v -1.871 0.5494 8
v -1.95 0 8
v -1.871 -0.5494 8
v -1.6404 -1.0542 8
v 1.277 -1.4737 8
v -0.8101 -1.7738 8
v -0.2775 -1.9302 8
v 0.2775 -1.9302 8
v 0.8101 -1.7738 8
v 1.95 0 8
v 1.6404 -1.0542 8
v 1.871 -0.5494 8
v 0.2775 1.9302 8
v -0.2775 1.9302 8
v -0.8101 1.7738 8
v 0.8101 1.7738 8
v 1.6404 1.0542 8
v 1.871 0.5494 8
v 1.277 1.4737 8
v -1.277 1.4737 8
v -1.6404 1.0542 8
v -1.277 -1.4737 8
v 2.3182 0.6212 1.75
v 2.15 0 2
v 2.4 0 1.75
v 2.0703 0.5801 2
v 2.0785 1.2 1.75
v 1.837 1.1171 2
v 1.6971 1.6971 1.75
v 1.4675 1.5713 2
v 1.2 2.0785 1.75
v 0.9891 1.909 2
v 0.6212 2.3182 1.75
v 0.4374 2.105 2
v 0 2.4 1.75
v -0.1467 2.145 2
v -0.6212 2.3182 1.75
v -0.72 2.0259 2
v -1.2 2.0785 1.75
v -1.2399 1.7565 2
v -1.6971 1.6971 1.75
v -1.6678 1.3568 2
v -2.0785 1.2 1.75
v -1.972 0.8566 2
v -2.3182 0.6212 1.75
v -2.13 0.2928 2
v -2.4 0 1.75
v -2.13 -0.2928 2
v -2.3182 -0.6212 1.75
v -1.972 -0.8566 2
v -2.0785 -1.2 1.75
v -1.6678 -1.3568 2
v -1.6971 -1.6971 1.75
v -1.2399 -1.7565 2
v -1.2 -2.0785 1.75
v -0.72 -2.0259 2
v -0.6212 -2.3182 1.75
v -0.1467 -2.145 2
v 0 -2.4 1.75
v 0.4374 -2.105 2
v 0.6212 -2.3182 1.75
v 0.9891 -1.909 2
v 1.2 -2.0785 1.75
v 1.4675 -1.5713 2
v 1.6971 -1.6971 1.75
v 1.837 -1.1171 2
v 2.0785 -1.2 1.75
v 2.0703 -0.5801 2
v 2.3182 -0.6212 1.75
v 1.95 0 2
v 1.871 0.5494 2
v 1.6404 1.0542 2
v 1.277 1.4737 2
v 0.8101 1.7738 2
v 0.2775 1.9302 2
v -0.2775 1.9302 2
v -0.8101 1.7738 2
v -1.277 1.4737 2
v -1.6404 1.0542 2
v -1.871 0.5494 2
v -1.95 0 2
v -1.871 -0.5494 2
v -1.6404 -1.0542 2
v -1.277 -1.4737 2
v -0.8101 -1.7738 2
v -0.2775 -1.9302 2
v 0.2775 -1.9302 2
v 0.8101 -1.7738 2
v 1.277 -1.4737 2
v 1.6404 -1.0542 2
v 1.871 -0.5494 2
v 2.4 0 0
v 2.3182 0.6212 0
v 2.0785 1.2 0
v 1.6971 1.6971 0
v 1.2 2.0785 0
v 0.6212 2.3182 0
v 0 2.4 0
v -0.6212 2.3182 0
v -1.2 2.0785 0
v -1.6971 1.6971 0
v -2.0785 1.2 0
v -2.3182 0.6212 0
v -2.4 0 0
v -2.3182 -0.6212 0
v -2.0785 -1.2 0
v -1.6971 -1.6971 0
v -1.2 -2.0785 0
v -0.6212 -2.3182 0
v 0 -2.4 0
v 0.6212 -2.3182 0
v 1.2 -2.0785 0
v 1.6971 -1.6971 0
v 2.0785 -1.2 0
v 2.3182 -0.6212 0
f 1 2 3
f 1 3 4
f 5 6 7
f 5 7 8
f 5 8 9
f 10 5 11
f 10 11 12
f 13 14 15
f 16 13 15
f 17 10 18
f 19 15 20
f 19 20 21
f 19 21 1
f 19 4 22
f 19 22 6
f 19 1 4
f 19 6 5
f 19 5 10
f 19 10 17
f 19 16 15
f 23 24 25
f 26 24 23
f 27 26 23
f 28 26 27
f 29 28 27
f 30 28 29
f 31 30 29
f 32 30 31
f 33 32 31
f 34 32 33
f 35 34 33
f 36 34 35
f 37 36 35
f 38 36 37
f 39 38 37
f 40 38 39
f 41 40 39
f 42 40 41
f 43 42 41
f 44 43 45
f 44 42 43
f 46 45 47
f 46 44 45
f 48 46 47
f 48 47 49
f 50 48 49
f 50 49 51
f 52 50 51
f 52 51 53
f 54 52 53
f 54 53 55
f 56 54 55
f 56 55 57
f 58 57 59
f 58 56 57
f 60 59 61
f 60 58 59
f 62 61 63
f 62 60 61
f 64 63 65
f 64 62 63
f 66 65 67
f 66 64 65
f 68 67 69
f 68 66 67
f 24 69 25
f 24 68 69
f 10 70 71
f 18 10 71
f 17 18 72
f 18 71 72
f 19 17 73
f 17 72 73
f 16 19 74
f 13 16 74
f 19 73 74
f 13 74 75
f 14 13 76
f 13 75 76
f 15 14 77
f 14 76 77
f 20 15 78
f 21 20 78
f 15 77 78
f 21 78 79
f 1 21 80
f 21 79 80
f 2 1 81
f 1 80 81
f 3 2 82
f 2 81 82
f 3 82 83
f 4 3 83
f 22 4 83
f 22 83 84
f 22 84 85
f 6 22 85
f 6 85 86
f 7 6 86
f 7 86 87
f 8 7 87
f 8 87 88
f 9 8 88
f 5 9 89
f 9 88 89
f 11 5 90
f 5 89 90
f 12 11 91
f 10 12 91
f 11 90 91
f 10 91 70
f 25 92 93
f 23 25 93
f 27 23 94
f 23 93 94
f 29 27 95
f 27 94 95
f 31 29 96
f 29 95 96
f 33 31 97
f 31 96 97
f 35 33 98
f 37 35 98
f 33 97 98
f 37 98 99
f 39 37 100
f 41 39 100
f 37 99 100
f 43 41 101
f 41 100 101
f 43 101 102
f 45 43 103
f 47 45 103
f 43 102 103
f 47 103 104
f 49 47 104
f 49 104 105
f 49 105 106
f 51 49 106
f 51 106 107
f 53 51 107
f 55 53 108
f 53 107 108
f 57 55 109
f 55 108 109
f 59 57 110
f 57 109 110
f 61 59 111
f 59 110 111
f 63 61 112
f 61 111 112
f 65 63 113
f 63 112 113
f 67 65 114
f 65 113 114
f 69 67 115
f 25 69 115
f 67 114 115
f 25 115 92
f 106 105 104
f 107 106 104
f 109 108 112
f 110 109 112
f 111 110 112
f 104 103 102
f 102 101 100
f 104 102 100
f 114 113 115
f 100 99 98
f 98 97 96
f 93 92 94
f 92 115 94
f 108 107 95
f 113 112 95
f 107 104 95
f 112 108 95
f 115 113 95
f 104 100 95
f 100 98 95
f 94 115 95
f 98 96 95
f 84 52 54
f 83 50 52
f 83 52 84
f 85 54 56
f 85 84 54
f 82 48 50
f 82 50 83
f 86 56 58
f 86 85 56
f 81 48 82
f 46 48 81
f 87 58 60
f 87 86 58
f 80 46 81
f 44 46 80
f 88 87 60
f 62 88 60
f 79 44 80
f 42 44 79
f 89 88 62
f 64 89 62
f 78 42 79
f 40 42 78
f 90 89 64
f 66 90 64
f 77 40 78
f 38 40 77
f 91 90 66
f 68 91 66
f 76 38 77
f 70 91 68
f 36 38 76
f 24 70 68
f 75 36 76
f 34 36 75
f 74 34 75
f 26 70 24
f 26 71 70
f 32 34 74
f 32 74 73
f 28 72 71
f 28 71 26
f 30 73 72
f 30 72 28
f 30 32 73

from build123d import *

# Parameters (mm, degrees)
SKETCH_1_R      = 2.4
EXTRUDE_1_DEPTH = 2
SKETCH_2_R      = 1.95
EXTRUDE_2_DEPTH = 6
CHAMFER_1_SIZE  = 0.25


with BuildPart() as part:
    # 草图1 → 拉伸1 (new body)
    with BuildSketch(Plane.XY):
        Circle(SKETCH_1_R)
    extrude(amount=EXTRUDE_1_DEPTH)

    # 草图2 → 拉伸2 (add)
    with BuildSketch(Plane.XY.offset(2)):
        Circle(SKETCH_2_R)
    extrude(amount=EXTRUDE_2_DEPTH)

    # 倒角1
    chamfer_1_edges = [part.edges().sort_by_distance(p)[0] for p in [
        (-2.4, 0, 2),
    ]]
    chamfer(chamfer_1_edges, length=CHAMFER_1_SIZE)


solid = part.part
